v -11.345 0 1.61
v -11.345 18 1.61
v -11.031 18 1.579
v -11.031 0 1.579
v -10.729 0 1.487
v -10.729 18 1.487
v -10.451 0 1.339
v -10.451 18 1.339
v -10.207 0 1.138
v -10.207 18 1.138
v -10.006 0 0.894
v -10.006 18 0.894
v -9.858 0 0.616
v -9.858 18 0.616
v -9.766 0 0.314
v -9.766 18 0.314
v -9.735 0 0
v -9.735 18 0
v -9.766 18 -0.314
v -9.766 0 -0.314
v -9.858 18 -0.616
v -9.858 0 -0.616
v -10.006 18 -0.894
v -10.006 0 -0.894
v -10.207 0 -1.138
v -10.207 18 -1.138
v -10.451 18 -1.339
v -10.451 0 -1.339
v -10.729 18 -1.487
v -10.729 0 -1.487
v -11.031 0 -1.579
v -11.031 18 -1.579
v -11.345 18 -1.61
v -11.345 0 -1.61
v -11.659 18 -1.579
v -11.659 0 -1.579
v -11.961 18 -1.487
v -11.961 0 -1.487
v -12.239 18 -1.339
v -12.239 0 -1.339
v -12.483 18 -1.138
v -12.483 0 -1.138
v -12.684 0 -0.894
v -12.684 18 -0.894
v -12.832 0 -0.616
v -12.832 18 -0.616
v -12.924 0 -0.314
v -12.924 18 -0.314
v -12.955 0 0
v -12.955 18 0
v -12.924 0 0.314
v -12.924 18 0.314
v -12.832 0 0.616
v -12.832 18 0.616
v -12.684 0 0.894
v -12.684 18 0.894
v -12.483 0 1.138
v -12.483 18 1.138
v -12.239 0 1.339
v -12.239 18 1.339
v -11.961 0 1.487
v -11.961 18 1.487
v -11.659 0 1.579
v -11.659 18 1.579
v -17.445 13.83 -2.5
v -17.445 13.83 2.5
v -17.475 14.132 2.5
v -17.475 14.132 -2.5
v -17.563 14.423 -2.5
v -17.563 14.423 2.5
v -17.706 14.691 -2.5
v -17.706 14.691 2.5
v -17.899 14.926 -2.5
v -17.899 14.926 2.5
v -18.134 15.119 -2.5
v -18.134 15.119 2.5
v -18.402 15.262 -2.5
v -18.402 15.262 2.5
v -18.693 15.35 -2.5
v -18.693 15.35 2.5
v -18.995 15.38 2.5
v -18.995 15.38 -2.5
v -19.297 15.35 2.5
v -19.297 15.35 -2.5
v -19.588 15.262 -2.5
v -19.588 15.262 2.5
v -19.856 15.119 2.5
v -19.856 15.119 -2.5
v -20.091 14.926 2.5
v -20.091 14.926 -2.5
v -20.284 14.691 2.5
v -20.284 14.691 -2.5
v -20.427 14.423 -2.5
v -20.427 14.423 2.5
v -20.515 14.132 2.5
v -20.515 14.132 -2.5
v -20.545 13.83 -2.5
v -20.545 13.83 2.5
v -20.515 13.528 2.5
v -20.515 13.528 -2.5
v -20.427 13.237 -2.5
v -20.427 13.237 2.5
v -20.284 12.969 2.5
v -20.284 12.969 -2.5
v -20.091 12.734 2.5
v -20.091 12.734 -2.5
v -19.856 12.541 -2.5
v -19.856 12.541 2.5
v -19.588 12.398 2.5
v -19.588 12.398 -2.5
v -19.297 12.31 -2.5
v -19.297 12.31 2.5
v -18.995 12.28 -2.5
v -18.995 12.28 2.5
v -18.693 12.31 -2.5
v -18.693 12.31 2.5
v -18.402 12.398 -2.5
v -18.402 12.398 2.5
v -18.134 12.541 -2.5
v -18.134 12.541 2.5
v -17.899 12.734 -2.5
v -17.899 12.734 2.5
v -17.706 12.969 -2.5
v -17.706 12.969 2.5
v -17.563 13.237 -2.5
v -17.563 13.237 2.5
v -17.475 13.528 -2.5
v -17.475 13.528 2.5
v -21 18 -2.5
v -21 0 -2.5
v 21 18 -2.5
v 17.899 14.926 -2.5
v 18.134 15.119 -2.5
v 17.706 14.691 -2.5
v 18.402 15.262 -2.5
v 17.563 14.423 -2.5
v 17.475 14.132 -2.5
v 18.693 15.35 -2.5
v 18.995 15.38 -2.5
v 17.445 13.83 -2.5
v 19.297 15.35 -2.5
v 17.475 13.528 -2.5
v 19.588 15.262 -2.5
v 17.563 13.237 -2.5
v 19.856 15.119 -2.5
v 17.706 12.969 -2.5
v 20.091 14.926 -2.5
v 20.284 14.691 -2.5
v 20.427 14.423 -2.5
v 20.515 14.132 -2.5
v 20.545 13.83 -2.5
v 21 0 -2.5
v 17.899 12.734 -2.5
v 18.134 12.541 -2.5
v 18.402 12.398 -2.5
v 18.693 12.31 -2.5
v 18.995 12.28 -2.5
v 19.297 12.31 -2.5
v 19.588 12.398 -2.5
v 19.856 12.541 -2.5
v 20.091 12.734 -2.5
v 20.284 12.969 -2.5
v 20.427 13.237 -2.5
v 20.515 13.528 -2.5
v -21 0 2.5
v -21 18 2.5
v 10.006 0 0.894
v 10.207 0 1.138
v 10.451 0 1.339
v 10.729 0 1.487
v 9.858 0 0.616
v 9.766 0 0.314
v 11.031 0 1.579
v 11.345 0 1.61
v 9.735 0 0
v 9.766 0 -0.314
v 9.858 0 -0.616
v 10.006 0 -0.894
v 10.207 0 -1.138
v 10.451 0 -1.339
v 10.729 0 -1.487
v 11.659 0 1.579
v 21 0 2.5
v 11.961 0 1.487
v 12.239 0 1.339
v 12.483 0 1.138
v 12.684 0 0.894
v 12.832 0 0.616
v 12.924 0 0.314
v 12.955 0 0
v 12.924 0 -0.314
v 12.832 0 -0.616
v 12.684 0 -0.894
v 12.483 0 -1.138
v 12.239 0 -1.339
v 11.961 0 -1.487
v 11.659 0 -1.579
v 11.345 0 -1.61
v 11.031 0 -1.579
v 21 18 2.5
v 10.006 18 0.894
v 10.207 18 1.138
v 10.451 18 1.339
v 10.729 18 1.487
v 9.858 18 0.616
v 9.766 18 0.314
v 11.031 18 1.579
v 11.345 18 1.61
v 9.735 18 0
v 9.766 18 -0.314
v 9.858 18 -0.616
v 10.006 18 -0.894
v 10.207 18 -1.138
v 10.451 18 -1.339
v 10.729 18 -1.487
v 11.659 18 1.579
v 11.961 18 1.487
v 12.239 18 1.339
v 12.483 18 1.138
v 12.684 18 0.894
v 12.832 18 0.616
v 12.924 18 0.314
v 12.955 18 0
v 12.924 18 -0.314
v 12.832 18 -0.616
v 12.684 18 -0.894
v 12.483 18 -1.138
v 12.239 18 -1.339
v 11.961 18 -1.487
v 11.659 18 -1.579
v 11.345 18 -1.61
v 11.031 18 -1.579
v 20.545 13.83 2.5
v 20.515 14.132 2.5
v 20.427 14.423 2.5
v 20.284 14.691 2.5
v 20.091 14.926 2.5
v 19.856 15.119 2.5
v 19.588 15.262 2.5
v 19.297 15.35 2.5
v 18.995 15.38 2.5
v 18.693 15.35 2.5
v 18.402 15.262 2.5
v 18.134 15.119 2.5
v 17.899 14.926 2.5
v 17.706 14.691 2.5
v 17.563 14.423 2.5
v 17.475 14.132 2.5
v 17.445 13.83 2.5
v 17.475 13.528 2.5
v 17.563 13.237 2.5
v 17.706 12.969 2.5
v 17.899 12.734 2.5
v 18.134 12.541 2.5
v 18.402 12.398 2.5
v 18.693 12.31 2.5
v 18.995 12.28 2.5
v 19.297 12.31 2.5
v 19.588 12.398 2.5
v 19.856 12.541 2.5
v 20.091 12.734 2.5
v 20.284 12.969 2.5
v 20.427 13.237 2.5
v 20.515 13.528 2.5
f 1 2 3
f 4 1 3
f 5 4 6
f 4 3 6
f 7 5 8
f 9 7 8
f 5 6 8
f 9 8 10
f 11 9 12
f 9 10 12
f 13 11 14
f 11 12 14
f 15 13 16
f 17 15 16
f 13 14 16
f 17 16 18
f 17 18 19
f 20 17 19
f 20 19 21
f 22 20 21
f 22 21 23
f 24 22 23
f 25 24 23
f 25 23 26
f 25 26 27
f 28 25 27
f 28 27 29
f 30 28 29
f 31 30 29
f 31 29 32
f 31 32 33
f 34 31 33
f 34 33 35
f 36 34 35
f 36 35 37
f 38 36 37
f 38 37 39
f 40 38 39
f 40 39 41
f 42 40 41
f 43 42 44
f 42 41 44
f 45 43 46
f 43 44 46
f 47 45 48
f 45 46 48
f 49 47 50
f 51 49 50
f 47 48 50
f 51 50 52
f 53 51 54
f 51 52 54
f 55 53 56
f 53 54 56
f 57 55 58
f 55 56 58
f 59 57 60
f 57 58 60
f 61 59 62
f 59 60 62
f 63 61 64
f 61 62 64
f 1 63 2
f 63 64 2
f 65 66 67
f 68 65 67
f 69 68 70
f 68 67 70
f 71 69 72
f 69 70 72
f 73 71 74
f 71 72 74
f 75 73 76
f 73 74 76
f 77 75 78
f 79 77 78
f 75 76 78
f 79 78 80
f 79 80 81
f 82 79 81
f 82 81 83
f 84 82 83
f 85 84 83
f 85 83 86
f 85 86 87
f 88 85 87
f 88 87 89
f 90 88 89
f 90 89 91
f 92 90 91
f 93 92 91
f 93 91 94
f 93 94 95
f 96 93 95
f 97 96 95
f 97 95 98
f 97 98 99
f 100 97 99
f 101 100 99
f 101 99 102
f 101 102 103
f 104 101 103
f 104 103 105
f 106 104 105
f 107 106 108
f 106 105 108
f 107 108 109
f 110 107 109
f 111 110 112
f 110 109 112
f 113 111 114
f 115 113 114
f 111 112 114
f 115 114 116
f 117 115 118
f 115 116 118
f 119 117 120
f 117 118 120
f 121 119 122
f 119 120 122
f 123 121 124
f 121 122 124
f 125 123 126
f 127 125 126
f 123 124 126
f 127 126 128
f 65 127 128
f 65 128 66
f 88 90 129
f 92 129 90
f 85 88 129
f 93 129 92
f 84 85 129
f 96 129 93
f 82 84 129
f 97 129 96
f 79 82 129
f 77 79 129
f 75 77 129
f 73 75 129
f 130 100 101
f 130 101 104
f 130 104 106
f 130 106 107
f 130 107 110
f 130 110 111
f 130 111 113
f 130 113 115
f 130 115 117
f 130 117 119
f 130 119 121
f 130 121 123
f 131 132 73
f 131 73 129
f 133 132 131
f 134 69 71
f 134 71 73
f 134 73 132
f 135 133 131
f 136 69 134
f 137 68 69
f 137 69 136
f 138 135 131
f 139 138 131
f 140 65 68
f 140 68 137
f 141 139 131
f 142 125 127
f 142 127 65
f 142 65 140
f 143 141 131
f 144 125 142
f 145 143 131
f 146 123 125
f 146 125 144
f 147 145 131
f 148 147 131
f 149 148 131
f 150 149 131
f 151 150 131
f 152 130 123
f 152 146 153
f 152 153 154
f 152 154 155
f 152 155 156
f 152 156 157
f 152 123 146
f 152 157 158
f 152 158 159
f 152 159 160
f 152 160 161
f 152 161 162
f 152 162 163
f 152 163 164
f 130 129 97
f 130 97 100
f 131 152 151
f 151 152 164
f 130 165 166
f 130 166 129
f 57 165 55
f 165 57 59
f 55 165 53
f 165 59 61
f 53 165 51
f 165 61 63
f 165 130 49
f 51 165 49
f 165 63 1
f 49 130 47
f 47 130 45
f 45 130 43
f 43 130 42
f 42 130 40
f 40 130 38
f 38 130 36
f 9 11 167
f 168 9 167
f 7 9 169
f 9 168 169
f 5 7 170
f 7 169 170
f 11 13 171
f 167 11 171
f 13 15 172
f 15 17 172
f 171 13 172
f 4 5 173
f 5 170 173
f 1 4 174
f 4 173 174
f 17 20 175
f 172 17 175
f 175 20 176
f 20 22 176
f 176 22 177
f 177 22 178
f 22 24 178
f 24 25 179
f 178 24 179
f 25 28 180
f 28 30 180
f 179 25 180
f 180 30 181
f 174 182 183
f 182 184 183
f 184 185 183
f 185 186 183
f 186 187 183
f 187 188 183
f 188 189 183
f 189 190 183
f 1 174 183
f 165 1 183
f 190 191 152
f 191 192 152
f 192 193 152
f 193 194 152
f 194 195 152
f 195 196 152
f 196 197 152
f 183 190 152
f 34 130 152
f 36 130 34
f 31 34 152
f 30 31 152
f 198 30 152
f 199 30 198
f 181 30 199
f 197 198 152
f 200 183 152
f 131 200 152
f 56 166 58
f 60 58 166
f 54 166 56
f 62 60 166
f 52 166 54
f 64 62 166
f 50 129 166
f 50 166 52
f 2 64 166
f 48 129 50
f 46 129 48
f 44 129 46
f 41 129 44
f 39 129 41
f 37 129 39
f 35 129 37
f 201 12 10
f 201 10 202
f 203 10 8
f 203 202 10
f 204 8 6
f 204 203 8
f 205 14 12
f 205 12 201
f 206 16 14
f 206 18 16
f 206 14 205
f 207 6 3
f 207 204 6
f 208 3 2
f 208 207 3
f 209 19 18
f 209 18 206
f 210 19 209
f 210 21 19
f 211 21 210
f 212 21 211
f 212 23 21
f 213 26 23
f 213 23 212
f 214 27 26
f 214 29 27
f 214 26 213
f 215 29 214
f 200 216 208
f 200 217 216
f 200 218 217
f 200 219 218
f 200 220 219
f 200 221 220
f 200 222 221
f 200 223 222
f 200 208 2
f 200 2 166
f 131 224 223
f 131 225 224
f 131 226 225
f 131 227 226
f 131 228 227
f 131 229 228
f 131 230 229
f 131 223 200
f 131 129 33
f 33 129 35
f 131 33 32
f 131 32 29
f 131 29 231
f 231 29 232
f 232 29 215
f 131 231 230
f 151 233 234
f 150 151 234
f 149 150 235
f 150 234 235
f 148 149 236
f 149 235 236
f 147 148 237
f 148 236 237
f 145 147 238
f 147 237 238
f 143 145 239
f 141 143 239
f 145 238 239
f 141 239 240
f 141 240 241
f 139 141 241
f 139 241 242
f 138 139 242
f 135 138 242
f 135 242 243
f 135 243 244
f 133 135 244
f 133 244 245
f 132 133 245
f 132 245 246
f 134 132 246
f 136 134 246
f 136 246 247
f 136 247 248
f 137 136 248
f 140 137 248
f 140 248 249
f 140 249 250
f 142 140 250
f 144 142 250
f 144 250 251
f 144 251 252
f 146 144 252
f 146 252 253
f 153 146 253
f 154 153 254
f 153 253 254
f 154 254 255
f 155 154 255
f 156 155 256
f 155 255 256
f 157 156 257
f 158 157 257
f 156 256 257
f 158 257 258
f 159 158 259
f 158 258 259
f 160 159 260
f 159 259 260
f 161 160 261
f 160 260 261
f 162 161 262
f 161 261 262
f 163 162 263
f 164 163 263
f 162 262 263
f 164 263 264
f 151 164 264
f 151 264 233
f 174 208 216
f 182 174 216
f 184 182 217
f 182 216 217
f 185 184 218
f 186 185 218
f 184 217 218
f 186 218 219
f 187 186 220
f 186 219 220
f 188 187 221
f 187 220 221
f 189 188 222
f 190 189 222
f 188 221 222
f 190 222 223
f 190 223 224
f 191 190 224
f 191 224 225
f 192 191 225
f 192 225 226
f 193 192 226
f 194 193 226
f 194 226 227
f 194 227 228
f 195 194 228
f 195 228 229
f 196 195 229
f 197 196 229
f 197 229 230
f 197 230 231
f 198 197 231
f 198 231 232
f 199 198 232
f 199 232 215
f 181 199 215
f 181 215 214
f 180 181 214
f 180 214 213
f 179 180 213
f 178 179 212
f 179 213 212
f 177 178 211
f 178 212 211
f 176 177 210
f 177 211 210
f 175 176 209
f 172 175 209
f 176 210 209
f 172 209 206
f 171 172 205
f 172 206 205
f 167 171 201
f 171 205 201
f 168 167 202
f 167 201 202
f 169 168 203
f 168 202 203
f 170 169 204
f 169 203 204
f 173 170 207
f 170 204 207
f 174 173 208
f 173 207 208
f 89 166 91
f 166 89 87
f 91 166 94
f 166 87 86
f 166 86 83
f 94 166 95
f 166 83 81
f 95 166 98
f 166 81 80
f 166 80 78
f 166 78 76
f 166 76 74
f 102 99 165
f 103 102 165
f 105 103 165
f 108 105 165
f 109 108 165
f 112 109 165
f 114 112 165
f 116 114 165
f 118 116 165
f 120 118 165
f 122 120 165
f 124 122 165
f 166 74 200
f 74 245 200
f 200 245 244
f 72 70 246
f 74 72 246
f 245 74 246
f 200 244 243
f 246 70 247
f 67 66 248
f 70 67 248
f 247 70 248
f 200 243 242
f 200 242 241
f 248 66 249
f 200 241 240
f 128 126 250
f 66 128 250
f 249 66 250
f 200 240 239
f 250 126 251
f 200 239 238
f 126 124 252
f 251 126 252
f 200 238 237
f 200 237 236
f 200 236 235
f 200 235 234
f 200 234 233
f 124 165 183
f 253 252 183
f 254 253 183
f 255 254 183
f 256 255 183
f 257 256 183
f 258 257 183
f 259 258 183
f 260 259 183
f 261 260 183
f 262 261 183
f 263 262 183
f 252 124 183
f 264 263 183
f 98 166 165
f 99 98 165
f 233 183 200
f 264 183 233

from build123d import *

# Parameters (mm, degrees)
SKETCH_1_W          = 42
SKETCH_1_H          = 5
EXTRUDE_1_DEPTH     = 18
SKETCH_2_R          = 1.55
CUT_EXTRUDE_1_DEPTH = 14.93
SKETCH_3_R          = 1.61
CUT_EXTRUDE_2_DEPTH = 28.771388154


with BuildPart() as part:
    # 草图1 → 凸台-拉伸1 (new body)
    with BuildSketch(Plane(origin=(0, 0, 0), x_dir=(1, 0, 0), z_dir=(0, 1, 0))):
        Rectangle(SKETCH_1_W, SKETCH_1_H)
    extrude(amount=EXTRUDE_1_DEPTH)

    # 草图2 → 切除-拉伸1 (cut)
    with BuildSketch(Plane.XY.offset(2.5)):
        with Locations((-18.995, 13.83)):
            Circle(SKETCH_2_R)
        with Locations((18.995, 13.83)):
            Circle(SKETCH_2_R)
    extrude(amount=-CUT_EXTRUDE_1_DEPTH, mode=Mode.SUBTRACT)

    # 草图3 → 切除-拉伸2 (cut, through all)
    with BuildSketch(Plane(origin=(0, 18, 0), x_dir=(1, 0, 0), z_dir=(0, 1, 0))):
        with Locations(Location((-11.345, 0, 0), (0, 0, 270))):
            Circle(SKETCH_3_R)
        with Locations(Location((11.345, 0, 0), (0, 0, 270))):
            Circle(SKETCH_3_R)
    extrude(amount=-CUT_EXTRUDE_2_DEPTH, mode=Mode.SUBTRACT)


solid = part.part
